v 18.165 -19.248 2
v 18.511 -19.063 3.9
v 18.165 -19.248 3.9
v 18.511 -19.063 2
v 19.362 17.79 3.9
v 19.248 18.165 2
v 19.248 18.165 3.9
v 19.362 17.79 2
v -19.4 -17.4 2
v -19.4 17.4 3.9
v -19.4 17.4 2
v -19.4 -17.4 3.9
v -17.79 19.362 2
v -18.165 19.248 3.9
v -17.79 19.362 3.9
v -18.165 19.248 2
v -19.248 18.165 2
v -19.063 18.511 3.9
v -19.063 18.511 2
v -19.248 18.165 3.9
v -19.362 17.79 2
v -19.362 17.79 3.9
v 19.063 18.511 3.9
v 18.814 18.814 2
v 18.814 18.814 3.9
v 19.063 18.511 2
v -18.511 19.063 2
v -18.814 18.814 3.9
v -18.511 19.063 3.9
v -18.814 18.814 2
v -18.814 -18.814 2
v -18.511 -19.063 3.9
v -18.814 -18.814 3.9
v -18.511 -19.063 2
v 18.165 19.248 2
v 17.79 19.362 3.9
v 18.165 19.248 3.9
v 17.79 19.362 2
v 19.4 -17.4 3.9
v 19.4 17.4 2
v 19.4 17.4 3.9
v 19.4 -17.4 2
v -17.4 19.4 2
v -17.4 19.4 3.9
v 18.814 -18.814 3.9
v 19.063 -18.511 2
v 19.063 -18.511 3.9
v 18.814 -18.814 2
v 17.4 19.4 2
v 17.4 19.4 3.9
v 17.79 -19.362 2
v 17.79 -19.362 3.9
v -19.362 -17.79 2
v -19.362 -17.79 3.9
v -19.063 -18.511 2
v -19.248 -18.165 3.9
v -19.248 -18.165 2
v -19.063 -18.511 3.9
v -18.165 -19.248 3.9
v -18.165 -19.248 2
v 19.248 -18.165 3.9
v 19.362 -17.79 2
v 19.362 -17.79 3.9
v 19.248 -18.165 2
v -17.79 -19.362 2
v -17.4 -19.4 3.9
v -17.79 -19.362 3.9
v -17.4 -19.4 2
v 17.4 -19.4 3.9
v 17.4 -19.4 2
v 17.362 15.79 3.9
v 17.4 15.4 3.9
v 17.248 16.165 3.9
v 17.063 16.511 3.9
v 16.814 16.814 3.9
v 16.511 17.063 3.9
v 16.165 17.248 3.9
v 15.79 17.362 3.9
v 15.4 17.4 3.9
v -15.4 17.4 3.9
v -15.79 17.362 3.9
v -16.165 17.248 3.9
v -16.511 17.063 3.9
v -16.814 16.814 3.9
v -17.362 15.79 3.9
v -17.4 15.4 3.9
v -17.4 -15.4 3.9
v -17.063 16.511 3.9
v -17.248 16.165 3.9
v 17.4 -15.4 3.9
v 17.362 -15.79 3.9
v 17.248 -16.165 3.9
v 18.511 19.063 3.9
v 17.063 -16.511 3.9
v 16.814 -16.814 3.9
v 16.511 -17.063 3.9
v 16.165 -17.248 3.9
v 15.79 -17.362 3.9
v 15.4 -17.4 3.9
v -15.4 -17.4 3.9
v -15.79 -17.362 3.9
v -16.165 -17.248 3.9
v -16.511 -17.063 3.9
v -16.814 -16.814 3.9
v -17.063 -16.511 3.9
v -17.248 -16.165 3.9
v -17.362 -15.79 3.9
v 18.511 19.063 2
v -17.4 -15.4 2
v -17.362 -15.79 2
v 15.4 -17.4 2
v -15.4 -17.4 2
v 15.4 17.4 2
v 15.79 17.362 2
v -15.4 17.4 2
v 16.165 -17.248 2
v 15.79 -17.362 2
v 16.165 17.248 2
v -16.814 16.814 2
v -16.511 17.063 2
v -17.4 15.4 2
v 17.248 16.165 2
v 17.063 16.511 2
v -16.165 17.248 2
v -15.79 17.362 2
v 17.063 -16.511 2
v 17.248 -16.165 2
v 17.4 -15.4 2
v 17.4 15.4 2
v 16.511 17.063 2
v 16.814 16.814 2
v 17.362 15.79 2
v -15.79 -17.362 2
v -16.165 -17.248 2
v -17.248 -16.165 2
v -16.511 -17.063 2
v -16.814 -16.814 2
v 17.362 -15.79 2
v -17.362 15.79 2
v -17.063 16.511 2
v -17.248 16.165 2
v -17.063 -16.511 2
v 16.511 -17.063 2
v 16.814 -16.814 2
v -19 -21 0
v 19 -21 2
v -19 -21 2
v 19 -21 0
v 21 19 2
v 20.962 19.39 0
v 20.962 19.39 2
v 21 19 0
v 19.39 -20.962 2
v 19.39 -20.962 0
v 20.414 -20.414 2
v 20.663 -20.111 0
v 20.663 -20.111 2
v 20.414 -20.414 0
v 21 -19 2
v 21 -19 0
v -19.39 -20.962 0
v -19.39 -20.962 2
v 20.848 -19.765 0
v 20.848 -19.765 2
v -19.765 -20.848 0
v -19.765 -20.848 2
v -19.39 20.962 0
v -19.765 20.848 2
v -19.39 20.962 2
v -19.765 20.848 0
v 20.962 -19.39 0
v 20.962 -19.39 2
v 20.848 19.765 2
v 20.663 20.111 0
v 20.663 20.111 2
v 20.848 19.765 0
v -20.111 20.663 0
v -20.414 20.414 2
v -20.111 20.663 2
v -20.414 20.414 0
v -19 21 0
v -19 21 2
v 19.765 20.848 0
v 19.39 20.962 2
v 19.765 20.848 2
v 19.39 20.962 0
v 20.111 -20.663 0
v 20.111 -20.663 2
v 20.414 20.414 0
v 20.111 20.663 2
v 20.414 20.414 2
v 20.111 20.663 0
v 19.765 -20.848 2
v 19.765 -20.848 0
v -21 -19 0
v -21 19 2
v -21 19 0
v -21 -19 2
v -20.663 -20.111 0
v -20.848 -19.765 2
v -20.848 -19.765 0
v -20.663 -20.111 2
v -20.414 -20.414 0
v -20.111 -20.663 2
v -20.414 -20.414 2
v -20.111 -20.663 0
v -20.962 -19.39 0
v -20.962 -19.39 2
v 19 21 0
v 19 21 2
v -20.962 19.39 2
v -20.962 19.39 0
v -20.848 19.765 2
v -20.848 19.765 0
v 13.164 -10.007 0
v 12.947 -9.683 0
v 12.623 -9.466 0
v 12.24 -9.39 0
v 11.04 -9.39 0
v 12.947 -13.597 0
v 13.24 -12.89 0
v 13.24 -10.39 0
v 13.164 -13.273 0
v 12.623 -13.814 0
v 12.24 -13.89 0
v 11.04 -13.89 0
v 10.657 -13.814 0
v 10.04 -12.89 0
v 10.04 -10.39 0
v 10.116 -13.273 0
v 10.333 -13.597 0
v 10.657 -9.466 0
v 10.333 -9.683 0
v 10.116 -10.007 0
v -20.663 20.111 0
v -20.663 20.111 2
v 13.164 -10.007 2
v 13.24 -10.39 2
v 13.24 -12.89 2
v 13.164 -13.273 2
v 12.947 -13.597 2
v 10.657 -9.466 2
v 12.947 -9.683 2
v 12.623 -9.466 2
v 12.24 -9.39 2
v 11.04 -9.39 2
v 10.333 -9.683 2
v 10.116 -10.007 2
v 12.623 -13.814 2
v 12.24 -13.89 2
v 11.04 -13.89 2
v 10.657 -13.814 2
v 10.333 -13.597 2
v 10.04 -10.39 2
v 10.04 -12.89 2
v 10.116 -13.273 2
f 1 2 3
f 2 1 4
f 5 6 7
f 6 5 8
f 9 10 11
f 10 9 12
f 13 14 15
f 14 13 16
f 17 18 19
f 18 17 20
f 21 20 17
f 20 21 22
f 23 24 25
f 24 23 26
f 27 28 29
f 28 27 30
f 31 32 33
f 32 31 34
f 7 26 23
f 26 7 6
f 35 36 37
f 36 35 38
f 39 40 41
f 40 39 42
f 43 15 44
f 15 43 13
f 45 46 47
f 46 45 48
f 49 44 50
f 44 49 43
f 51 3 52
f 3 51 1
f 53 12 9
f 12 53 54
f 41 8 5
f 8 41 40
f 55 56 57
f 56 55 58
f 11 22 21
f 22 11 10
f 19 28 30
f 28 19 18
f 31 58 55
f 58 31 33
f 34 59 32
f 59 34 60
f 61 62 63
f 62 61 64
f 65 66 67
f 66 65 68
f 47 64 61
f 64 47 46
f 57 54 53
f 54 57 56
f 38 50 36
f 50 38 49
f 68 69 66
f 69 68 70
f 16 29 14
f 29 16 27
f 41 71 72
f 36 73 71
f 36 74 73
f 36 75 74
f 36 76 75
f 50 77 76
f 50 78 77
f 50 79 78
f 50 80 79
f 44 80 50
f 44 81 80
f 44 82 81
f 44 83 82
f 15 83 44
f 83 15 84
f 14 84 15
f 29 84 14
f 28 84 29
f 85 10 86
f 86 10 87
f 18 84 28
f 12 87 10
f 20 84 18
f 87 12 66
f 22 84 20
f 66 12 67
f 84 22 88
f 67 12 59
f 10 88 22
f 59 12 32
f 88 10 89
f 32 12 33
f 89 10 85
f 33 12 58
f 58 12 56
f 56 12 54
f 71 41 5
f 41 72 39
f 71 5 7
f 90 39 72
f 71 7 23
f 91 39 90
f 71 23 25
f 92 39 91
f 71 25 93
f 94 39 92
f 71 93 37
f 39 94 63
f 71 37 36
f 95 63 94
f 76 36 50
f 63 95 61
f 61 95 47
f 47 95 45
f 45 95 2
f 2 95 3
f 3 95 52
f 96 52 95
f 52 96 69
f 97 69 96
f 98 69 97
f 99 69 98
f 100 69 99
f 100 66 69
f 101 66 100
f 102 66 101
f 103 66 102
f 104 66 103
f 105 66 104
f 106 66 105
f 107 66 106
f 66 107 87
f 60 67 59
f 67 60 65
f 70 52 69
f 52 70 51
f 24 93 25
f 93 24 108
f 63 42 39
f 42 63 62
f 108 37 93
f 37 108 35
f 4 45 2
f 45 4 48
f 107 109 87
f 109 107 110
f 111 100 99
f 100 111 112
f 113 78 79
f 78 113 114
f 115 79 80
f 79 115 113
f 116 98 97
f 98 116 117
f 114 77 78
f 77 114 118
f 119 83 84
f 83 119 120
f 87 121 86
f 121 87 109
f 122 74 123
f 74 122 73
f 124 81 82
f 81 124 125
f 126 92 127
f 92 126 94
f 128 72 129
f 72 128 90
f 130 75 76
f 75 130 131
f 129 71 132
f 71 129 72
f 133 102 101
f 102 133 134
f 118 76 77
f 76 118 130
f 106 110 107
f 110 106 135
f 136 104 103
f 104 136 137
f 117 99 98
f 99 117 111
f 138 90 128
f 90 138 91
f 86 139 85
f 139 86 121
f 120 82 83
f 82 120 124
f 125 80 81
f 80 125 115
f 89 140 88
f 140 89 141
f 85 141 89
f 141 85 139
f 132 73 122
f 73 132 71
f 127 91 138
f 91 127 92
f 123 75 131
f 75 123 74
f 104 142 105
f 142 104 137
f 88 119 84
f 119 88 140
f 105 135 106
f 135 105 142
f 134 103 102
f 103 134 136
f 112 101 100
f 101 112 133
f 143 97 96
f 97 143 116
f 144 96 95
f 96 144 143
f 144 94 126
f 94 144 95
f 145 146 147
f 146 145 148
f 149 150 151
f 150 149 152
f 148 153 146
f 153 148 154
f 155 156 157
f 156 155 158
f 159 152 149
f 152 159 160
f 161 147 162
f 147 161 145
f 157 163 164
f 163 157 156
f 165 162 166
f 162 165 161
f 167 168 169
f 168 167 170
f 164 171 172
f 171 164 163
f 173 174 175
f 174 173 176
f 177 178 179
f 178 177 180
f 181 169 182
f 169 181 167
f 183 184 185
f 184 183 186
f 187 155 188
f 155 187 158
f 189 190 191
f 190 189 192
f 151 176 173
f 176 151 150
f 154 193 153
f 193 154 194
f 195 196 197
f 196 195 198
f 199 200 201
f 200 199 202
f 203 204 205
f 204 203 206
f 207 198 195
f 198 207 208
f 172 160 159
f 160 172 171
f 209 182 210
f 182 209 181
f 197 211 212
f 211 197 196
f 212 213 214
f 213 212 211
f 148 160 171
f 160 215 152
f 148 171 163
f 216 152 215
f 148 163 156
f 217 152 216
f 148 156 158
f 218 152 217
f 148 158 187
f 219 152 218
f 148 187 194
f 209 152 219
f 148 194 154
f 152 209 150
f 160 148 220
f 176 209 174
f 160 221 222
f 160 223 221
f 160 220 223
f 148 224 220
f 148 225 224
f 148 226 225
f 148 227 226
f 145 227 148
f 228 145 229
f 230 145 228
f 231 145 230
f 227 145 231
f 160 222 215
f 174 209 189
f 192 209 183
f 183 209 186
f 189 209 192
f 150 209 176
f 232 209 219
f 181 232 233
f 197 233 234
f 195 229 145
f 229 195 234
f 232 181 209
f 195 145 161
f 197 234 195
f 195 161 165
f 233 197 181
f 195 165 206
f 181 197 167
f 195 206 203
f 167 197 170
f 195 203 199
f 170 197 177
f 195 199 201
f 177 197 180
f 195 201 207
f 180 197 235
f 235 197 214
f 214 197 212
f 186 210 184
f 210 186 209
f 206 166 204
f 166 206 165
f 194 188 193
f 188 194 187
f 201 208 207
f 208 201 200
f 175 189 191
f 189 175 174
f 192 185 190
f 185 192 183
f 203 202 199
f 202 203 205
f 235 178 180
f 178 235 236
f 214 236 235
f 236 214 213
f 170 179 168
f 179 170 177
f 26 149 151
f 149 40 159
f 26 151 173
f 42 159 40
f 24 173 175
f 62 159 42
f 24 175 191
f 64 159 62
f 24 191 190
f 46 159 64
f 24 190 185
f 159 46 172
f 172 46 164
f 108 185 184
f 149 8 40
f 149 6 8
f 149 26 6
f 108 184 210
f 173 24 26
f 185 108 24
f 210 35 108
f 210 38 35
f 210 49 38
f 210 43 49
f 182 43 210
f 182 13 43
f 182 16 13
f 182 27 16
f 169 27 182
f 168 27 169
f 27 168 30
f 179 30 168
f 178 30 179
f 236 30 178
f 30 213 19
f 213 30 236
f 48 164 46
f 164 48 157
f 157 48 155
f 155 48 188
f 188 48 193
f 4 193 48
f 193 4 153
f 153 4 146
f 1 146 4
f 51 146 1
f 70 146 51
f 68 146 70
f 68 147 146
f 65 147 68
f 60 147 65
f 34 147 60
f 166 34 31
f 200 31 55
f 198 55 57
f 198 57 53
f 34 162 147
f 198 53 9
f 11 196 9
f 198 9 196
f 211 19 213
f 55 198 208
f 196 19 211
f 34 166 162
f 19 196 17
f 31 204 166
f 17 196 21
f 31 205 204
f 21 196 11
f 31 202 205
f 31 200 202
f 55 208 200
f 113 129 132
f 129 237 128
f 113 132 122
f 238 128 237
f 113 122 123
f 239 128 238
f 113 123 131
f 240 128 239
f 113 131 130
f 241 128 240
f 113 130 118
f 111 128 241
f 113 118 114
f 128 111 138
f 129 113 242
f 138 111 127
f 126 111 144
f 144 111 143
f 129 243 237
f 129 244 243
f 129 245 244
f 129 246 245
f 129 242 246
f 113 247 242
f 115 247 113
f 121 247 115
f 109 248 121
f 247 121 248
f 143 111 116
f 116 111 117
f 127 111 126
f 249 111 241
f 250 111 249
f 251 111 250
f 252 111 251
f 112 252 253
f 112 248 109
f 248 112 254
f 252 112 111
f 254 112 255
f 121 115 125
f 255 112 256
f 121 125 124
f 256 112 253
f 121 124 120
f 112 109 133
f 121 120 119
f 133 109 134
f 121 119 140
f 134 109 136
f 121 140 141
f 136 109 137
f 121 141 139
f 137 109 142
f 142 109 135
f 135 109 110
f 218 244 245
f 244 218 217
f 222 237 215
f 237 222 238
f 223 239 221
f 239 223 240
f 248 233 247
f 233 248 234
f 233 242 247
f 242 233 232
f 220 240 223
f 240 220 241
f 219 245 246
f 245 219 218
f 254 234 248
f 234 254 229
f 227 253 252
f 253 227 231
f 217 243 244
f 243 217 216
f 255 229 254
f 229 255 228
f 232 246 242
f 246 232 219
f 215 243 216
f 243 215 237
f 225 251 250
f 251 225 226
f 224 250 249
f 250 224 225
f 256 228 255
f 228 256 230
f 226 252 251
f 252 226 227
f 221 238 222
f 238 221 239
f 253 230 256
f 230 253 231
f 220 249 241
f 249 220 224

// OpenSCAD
// file: speaker_stand.scad
//
// Speaker Stand
//
// by Yasuhiro Wabiko
//
// This work is licensed under a Creative Commons Attribution 4.0 International License.
// https://creativecommons.org/licenses/by/4.0/
//
// See
//    https://github.com/ywabiko/3d/blob/master/Speaker/README.md
// for build instructions.
//
use <prim.scad>

default_stand_z =40;
default_base_x = 36;
default_base_y = 36;
default_base_z = 4;
default_base_r = 2;
default_pole_r = 4; // pole body radius
default_pole_z = 36;
default_pole_rr = 1; // pole corner radius
default_joint_z = 2;
default_joint_extra_z = 0;
default_joint_r = 3;


WELDING = 0.1;

// render target; this is meant to be overriden by Makefile
TARGET="default";

//
// top level logic
//
speaker_stand_main();

module speaker_stand_main(target=TARGET){
    
    if (target == "default") {
        speaker_stand(stand_z=40, base_x=30, base_y=30, pole_r=8);
    }

    if (target == "ce32a") {
        speaker_stand(stand_z=40, base_x=(36-2)*0.8, base_y=(36-2)*0.8, pole_r=4);
    }

    if (target == "ce32a_type2") {
        speaker_stand(stand_z=40, base_x=(33.2-2)*0.8, base_y=(33.2-2)*0.8, pole_r=4);
    }

    if (target == "b1s") {
        speaker_stand(stand_z=40, base_x=(40-2)*0.8, base_y=(40-2)*0.8, pole_r=4);
    }

    if (target == "ce32a_tallboy") {
        speaker_stand(stand_z=40, base_z=0, pole_r=18, base_x=32*0.8, base_y=32*0.8);
    }

    if (target == "b1s_tallboy") {
        speaker_stand(stand_z=40, base_x=(40-2)*0.8, base_y=(40-2)*0.8, pole_r=4);
    }

}

// [Public]
// A speaker stand.
//
// stand_z = total height (= base height + pole height) i.e how high the speaker is put from the ground.
// (base_x, base_y, base_z, base_r) = stand base dimension
// (joint_z, joint_r) = joint configuration
// pole_r = pole radius
//
// NOTE: pole height is generated by total height - base_height.
module speaker_stand(stand_z = default_stand_z,
                     base_x = default_base_x,
                     base_y = default_base_y,
                     base_z = default_base_z,
                     base_r = default_base_r,
                     joint_r = default_joint_r,
                     joint_z = default_joint_z,
                     pole_r = default_pole_r,
                     pole_rr = default_pole_rr) {

    pole_z = stand_z-base_z;

    speaker_stand_unit(stand_z = stand_z,
                       base_x = base_x,
                       base_y = base_y,
                       base_z = base_z,
                       base_r = base_r,
                       joint_r = joint_r,
                       joint_z = joint_z,
                       pole_r = pole_r,
                       pole_z = pole_z,
                       pole_rr = default_pole_rr );
}

// (for testing) when you want to override design parameters in detail
module speaker_stand_unit(stand_z = default_stand_z,
                          base_x = default_base_x,
                          base_y = default_base_y,
                          base_z = default_base_z,
                          base_r = default_base_r,
                          joint_r = default_joint_r,
                          joint_z = default_joint_z,
                          joint_extra_z  = default_joint_extra_z,
                          pole_r = default_pole_r,
                          pole_z = default_pole_z,
                          pole_rr = default_pole_rr,
                          joint_fn = 32,
                          pole_fn = 64,
                          base_fn = 64,
                          clip_z = 0.6) {
    clip_r = joint_r;
    
    translate([0, 0, 0]) {
        // base plate
        translate([0, 0, base_z/2]) {
            prim_round_zplate0(base_x, base_y, base_z, base_r, base_fn);
        }

        translate([0, 0, pole_z/2]) {
            difference() {
                union() {
                    // pole (inner joint)
                    translate([0, 0, pole_z/2+joint_z/2-WELDING+clip_z/2]) {
                        cylinder(r = joint_r, $fn = joint_fn, h = joint_z+WELDING+clip_z, center=true);
                    }

                    // clip
                    translate([0, 0, pole_z/2+joint_z+clip_z/2]) {
                        minkowski() {
                            cylinder(r = clip_r, $fn = joint_fn, h = 0.2, center=true);
                            sphere(r=0.2, $fn=32);
                        }
                    }
                }
                union() {
                    // slits for easier joint 
                    translate([0, 0, pole_z/2]) {
                        for (i=[0:1:7]) {
                            rotate([0,0,45*i]) {
                                cube([8, 0.4, joint_z*6], center=true);
                            }
                        }
                    }

                    // pole (empty inside)
                    translate([0, 0, pole_z/2+joint_z/2-WELDING+clip_z/2]) {
                        //    cylinder(r = joint_r-0.5, $fn = joint_fn, h = joint_z+WELDING*4+clip_z, center=true);
                    }
                }
            } // difference

            // pole (outer)
            translate([0, 0, base_z/2-WELDING]) {
                //cylinder(r = pole_r, $fn = pole_fn, h = pole_z-base_z+WELDING, center=true);
                prim_round_zplate0(pole_r*2, pole_r*2, pole_z-base_z+WELDING, pole_rr, 32);
            }

            // pole (joint's inner stuffing for more strength)
            translate([0, 0, pole_z/2+joint_z/2-WELDING+clip_z/2]) {
                cylinder(r = clip_r-1, $fn = joint_fn, h = joint_z+WELDING+clip_z, center=true);
            }
        }
    }
}
// main file
//
// Aura NSW1-205 1" Speaker Enclosure Rev.1
//
// by Yasuhiro Wabiko
//
// This work is licensed under a Creative Commons Attribution 4.0 International License.
// https://creativecommons.org/licenses/by/4.0/
//
// See
//    https://github.com/ywabiko/3d/blob/master/Speaker/README.md
// for build instructions.
//
use <speaker_stand.scad>
use <prim.scad>

// printer error related tweaks
LID_ERROR   = 0.0; // if the lid does not fit, make this larger.
                   // Wood PLA: 0.8 (0.1-0.4 too small). 0.8 a bit too loose.
                   // PLA: 0.0 (0.8 too large.)

SHELL_ERROR = 0.0; // if the speaker driver does not fit, make this larger.

// shape parameters
wall_t = 1.0;  // wall wall_tness
spfn =  8;   // minkowski resolution

// inner size of the box
size_x = 40;
size_dx = 10; // extra front wall thickness inside size_x
size_y = 38.8;
size_z = 38.8;

// outer size of the box
shell_x = 46;
shell_y = 42;
shell_z = 42;
shell_r = 2;
    

lid_inner_x = 2.0; // thickness of lid inner part
lid_wall_t = 2.0;
lid_arm_r = 2.0;
lid_hole_y = 3.0;
lid_hole_z = 2.0;

// further customization example: make a hole on the front surface
// coordinates are from left-bottom edge of inner space

// speaker center hole
speaker_dia = 36.6; // speaker diameter
front_hole_r0 = speaker_dia/2;
front_spfn   = 64;  // minkowski resolution

// spaker mount holes at corners
MOUNT_DIA    = 43;  // mount holes layout diameter
front_hole_r = 2; // mount hole radius
mount_spfn   = 16;  // minkowski resolution

// a hole on the lid side
lid_hole_y = 3;
lid_hole_z = 3;
lid_hole_r = 2;

//
// internals
//
WELDING = 0.1;

// render target; this is meant to be overriden by Makefile
TARGET="unit_lid_test";

//
// top level logic
//
aura205_main();

module aura205_main(target=TARGET){
    
    if (target == "default") {
        aura205(with_stand=0, with_print=1);
    }

    if (target == "body_only") {
        rotate([0, 90, 0]) {
            aura205_unit_body_only(shell_x, shell_y, shell_z, with_stand=1);
        }
    }

    if (target == "with_stand") {
        aura205(with_stand=1, with_print=1);
    }

    if (target == "stand_only") {
        oy=36;
        translate([-oy-3, -oy/2+3, 0]) {
            aura205_unit_stand();
        }
    }

    if (target == "unit_test") {
        translate([40,0,0]) {
            aura205_unit_body_only(shell_x, shell_y, shell_z);
        }
        aura205_unit_lid_only(shell_x,  shell_y, shell_z, with_hole=0);
    }

    if (target == "unit_lid_test") {
        rotate([0,-90,0]) {
            aura205_unit_lid_only(shell_x, shell_y, shell_z, lid_wall_t=2, with_hole=1);
        }
    }

    if (target == "stand_test") {
        translate([0, 3, 0]) {
            aura205_unit_stand();
        }
    }

    if (target == "joint_test") {
        // render small joint only for joint testing
        translate([3,0,0]) {
            aura205_unit_stand();
        }
    }
    
}


// -------------------------
// Public Modules
// -------------------------

// [Public]
// Minimum size enclosure.
//
// with_print = { 0: edit layout, 1: print layout}
module aura205(with_print=1, with_stand=0, with_lid=1){
    aura205_unit(ox=shell_x, oy=shell_y, oz=shell_z, with_print=with_print, with_hole=1, with_stand=with_stand, with_lid=with_lid);
}

// [Public]
// Variable size enclosure. Typically to be embededd in another project.
// 
// ox, oy, oz = dimension (this has to be equals to or larger than (size_x, size_y, size_z).
// with_print = { 0: edit layout, 1: print layout}
module aura205_unit(ox, oy, oz, lid_wall_t=lid_wall_t, with_print=1, shell_error=SHELL_ERROR, lid_error=LID_ERROR,
                  stand_height=40,
                  with_stand=0, with_hole=0, with_body=1, with_lid=1){
    if (with_print) {
        if (with_body) {
            translate([0, oy/2, ox/2]) {
                rotate([0, 90, 0]) {
                    aura205_unit_body_only(ox=ox, oy=oy, oz=oz, shell_error=shell_error, with_stand=with_stand, with_hole=with_hole);
                }
            }
        }
        if (with_lid) {
            translate([-oy-3, oy/2, 0]) {
                rotate([0, -90, 0]) {
                    aura205_unit_lid_only(ox, oy, oz, lid_wall_t=lid_wall_t, shell_error=shell_error, lid_error=lid_error, with_hole=with_hole);
                }
            }
        }
        if (with_stand) {
            translate([oy+3, oy/2, 0]) {
                rotate([0,0,0]) {
                    aura205_unit_stand(stand_z=40, base_x=(ox-2)*0.8, base_y=(oy-2)*0.8, base_z=4);
                }
            }
        }
    } else {
        aura205_unit_body_only(ox=ox, oy=oy, oz=oz, shell_error=shell_error, with_stand=with_stand);
        translate([-ox,0,0]) {
            aura205_unit_lid_only(ox, oy, oz, lid_wall_t=lid_wall_t, shell_error=shell_error, lid_error=lid_error, with_hole=with_hole);
        }
        if (with_stand) {
            translate([40,0,0]) {
                rotate([0,90,0]) {
                    aura205_unit_stand(stand_z=40, base_x=(ox-2)*2, base_y=(oy-2)*2, base_z=4);
                }
            }
        }
    }
}

module aura205_unit_stand(stand_z=40, base_x=36, base_y=36, base_z=4){
    speaker_stand(stand_z=stand_z, base_x=base_x, base_y=base_y, base_z=base_z);
}

// [Public]
// Variable size enclosure (body only). Typically for testing purpose.
// 
// ox, oy, oz = dimension (this has to be equals to or larger than (size_x, size_y, size_z).
module aura205_unit_body_only(ox, oy, oz, shell_error=SHELL_ERROR, with_stand=0){
    fn = 32;
    difference(){
        translate([0, 0, 0]) {
            prim_round_xplate0(ox, oy, oz, shell_r, fn);
        }
        translate([-size_dx, 0, 0])
            aura205_shell_negative_volume(sx=ox, sy=size_y, sz=size_z, dx=size_dx, st=wall_t, sr0=front_hole_r0, sr=front_hole_r, shr=shell_r, sf=fn, se=shell_error, with_stand=with_stand);
    }
}

// [Public]
// Variable size enclosure (lid only). Typically for testing purpose.
// 
// ox, oy, oz = dimension (this has to be equals to or larger than (size_x, size_y, size_z).
// with_hole  = { 0: without hole, 1: with hole } // a hole for cables
// with_arm   = { 0: without arm, 1: with arm }   // arms to support the speaker driver (experimental)
module aura205_unit_lid_only(ox, oy, oz, lid_wall_t=wall_t, with_hole=0, with_arm=0, shell_error=SHELL_ERROR, lid_error=LID_ERROR){
    // arm
    if (with_arm) {
        translate([0,0,0]) {
            aura205_lid_arm(ox, oy-wall_t*2, oz-wall_t*2, wall_t, lid_arm_r, spfn);
        }
    }

    // lid
    translate([lid_wall_t/2,0,0]) {
        difference(){
            aura205_lid_body(ox=ox, oy=oy, oz=oz, sx=size_x, sy=size_y, sz=size_z, st=wall_t, lix=lid_inner_x, lt=lid_wall_t, sr=shell_r, shr=shell_r, sf=spfn, se=shell_error, le=lid_error, with_hole=with_hole);
            aura205_lid_negative_volume(ox=ox, oy=oy-wall_t*2.1, oz=oz-wall_t*2.1, sx=size_x, sy=size_y, sz=size_z, hy=lid_hole_y, hz=lid_hole_z, lix=lid_inner_x, lt=lid_wall_t, with_hole=with_hole);
        }
            
    }
}


// -------------------------
// Private Modules
// -------------------------

// cube inner volume (negative volume. this part will be subtracted to make room for stuffings.)
module aura205_shell_negative_volume(sx, sy, sz, dx, st, sr0, sr, shr, sf, se=SHELL_ERROR, with_stand=1) {
    translate([-wall_t,0,0]) {
        #prim_round_xplate0(sx, sy+se, sz+se, shr, sf);
    }

    // center speaker hole
    translate([sx/2, 0, 0]) {
        rotate([0, 90, 0]) {
            #cylinder(r = sr0, $fn = 64, h=st*3+dx*2, center=true);
            }
    }

    dd = MOUNT_DIA/1.414/2; // 1.414 = sqrt(2); y- and z-axis distance from center to mount holes
    
    // corner mount holes
    translate([sx/2+st/2, 0, 0]) {
        for (ix=[-1,1]) {
            for (iy=[-1,1]) {
                translate([0, dd*ix, dd*iy]) {
                    rotate([0, 90, 0]) {
                        #cylinder(r = sr, $fn = 16, h = st*4+dx*2, center=true);
                    }
                }
            }
        }
    }

    if (with_stand) {
        translate([dx, 0, sz/2+st/2]) {
            #cylinder(r = 3, $fn = 32, h = st*4, center=true);
        }
    }

}

// experimental: arms to support speaker driver
module aura205_lid_arm(sx, sy, sz, st, sr, sf) {
    dx = 4;
    dy = sy/2-st-sr*1.1;
    dz = sz/2-st-sr*1.1;
    translate([-dx/2, 0, 0]) {
        for (iy=[-1,1]) {
            for (iz=[-1,1]) {
                translate([0, dy*iy, dz*iz]) {
                    rotate([0, 90, 0]) {
                        cylinder(r = sr, $fn = 16, h = sx-dx, center=true);
                    }
                }
            }
        }
    }
}

module aura205_lid_body(ox, oy, oz, sx, sy, sz, st, lix, lt, sr, shr, sf, se=SHELL_ERROR, le=LID_ERROR, with_hole=0) {
    fn = 32;
    // outer
    prim_round_xplate0(lt, oy, oz, shr, fn);

    // inner
    translate([lt/2+lix/2-WELDING,0,0]) {
        difference(){
            prim_round_xplate0(lix, sy+se-le, sz+se-le, shr, fn);
            translate([WELDING,0,0]) {
                prim_round_xplate0(lix+WELDING, sy+se-le-lt*2, sz+se-le-lt*2, shr, fn);
            }
        }
    }
}


module aura205_lid_negative_volume(ox, oy, oz, sx, sy, sz, hy, hz, lt, with_hole=1) {
    y3 = 6; // 3-cable width (22 AWG)
    y2 = 4.5; // 2-cable width (22 AWG)
    z1 = 3.2; // 1-cable height (22 AWG)

    // cable hole
    if (with_hole) {
        translate([lt,-sy*0.3,-sz*0.3]) {
            #prim_round_xplate0(lt*3, y2, z1, 1, 16);
        }
    }
}
